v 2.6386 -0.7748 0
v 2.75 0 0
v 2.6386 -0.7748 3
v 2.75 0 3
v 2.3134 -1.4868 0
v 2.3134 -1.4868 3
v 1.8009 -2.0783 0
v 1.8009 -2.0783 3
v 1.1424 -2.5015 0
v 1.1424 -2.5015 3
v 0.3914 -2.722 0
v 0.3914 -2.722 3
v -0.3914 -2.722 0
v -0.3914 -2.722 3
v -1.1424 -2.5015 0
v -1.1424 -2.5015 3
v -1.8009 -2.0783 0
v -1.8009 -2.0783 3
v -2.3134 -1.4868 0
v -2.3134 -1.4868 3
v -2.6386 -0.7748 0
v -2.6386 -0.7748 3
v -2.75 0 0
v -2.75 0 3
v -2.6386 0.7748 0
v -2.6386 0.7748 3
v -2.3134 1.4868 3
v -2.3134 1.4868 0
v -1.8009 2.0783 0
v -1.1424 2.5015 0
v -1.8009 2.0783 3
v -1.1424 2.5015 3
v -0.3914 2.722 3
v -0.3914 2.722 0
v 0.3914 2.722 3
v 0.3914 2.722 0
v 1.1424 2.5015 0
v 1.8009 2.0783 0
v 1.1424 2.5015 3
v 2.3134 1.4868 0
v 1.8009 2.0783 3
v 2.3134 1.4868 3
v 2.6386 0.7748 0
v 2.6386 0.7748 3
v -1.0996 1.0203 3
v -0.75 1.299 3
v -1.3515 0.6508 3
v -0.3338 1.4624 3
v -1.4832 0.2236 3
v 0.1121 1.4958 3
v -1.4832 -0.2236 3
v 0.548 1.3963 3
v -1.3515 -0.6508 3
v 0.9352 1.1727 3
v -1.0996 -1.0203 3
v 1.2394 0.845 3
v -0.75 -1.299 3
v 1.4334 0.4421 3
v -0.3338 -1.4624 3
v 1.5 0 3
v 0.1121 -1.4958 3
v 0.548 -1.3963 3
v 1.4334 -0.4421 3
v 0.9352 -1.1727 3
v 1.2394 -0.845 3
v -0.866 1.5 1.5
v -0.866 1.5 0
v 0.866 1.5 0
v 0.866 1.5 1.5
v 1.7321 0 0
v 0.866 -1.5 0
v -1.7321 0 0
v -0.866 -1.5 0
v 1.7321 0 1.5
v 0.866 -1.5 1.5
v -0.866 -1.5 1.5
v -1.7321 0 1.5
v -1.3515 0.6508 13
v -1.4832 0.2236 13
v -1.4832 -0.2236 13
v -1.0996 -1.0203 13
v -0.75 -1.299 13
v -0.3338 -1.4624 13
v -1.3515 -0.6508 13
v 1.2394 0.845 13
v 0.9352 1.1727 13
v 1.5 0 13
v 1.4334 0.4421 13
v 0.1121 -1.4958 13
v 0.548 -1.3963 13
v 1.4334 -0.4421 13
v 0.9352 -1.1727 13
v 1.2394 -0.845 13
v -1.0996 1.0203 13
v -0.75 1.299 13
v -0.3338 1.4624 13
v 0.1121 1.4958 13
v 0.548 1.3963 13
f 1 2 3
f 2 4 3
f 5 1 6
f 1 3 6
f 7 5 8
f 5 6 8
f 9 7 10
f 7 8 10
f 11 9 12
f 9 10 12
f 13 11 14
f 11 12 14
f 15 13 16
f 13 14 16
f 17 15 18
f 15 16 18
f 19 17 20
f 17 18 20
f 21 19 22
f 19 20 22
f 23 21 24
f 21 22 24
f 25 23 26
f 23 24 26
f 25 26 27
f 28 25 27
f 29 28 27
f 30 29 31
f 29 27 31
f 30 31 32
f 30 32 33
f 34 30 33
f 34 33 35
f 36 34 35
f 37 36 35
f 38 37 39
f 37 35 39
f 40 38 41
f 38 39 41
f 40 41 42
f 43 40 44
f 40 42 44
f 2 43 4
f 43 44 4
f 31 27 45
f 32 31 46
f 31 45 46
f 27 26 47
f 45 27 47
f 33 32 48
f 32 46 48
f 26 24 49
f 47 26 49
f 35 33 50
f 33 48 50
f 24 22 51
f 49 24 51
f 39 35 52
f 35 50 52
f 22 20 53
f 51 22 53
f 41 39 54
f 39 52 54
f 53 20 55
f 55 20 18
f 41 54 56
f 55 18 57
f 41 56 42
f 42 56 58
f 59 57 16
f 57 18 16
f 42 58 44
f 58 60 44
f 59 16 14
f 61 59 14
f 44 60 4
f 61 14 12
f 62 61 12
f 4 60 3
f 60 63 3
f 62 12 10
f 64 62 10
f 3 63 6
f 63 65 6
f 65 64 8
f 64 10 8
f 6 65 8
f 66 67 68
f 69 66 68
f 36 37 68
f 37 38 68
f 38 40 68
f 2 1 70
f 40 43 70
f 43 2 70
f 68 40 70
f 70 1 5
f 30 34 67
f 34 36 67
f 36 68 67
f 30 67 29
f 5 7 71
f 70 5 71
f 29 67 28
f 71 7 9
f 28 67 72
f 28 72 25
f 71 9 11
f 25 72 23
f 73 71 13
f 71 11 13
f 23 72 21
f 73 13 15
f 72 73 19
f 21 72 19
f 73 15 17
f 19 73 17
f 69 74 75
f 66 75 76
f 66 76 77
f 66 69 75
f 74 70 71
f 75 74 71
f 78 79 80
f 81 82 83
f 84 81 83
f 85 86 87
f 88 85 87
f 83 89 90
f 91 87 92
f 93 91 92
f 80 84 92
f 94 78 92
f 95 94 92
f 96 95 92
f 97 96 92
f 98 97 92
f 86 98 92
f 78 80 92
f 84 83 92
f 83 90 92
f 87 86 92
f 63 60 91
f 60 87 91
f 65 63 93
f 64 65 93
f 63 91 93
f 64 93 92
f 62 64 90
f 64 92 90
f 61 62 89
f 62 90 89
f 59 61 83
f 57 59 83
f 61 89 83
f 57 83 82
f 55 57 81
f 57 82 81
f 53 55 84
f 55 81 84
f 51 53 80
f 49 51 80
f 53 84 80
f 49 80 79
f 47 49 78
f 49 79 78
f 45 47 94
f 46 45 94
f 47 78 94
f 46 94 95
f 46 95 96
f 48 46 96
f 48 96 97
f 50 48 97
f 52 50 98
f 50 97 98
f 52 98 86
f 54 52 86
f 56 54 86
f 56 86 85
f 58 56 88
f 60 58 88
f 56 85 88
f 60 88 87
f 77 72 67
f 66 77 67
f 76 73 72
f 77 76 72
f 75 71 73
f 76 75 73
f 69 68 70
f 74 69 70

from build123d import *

# Parameters (mm, degrees)
CORTE_EXTRUS_O1_DEPTH = 1.5


with BuildPart() as part:
    # Esboço1 → Revolução1 (revolve)
    with BuildSketch(Plane(origin=(0, 0, 0), x_dir=(1, 0, 0), z_dir=(0, 1, 0))):
        Polygon((0, 0), (2.75, 0), (2.75, -3), (1.5, -3), (1.5, -13), (0, -13), (0, -3), align=None)
    revolve(axis=Axis((0, 0, 3), (0, 0, -1)))

    # Esboço2 → Corte-extrusão1 (cut)
    with BuildSketch(Plane(origin=(0, 0, 0), x_dir=(-1, 0, 0), z_dir=(0, 0, -1))):
        Polygon((1.732050808, 0), (0.866025404, 1.5), (-0.866025404, 1.5), (-1.732050808, 0), (-0.866025404, -1.5), (0.866025404, -1.5), align=None)
    extrude(amount=-CORTE_EXTRUS_O1_DEPTH, mode=Mode.SUBTRACT)


solid = part.part
